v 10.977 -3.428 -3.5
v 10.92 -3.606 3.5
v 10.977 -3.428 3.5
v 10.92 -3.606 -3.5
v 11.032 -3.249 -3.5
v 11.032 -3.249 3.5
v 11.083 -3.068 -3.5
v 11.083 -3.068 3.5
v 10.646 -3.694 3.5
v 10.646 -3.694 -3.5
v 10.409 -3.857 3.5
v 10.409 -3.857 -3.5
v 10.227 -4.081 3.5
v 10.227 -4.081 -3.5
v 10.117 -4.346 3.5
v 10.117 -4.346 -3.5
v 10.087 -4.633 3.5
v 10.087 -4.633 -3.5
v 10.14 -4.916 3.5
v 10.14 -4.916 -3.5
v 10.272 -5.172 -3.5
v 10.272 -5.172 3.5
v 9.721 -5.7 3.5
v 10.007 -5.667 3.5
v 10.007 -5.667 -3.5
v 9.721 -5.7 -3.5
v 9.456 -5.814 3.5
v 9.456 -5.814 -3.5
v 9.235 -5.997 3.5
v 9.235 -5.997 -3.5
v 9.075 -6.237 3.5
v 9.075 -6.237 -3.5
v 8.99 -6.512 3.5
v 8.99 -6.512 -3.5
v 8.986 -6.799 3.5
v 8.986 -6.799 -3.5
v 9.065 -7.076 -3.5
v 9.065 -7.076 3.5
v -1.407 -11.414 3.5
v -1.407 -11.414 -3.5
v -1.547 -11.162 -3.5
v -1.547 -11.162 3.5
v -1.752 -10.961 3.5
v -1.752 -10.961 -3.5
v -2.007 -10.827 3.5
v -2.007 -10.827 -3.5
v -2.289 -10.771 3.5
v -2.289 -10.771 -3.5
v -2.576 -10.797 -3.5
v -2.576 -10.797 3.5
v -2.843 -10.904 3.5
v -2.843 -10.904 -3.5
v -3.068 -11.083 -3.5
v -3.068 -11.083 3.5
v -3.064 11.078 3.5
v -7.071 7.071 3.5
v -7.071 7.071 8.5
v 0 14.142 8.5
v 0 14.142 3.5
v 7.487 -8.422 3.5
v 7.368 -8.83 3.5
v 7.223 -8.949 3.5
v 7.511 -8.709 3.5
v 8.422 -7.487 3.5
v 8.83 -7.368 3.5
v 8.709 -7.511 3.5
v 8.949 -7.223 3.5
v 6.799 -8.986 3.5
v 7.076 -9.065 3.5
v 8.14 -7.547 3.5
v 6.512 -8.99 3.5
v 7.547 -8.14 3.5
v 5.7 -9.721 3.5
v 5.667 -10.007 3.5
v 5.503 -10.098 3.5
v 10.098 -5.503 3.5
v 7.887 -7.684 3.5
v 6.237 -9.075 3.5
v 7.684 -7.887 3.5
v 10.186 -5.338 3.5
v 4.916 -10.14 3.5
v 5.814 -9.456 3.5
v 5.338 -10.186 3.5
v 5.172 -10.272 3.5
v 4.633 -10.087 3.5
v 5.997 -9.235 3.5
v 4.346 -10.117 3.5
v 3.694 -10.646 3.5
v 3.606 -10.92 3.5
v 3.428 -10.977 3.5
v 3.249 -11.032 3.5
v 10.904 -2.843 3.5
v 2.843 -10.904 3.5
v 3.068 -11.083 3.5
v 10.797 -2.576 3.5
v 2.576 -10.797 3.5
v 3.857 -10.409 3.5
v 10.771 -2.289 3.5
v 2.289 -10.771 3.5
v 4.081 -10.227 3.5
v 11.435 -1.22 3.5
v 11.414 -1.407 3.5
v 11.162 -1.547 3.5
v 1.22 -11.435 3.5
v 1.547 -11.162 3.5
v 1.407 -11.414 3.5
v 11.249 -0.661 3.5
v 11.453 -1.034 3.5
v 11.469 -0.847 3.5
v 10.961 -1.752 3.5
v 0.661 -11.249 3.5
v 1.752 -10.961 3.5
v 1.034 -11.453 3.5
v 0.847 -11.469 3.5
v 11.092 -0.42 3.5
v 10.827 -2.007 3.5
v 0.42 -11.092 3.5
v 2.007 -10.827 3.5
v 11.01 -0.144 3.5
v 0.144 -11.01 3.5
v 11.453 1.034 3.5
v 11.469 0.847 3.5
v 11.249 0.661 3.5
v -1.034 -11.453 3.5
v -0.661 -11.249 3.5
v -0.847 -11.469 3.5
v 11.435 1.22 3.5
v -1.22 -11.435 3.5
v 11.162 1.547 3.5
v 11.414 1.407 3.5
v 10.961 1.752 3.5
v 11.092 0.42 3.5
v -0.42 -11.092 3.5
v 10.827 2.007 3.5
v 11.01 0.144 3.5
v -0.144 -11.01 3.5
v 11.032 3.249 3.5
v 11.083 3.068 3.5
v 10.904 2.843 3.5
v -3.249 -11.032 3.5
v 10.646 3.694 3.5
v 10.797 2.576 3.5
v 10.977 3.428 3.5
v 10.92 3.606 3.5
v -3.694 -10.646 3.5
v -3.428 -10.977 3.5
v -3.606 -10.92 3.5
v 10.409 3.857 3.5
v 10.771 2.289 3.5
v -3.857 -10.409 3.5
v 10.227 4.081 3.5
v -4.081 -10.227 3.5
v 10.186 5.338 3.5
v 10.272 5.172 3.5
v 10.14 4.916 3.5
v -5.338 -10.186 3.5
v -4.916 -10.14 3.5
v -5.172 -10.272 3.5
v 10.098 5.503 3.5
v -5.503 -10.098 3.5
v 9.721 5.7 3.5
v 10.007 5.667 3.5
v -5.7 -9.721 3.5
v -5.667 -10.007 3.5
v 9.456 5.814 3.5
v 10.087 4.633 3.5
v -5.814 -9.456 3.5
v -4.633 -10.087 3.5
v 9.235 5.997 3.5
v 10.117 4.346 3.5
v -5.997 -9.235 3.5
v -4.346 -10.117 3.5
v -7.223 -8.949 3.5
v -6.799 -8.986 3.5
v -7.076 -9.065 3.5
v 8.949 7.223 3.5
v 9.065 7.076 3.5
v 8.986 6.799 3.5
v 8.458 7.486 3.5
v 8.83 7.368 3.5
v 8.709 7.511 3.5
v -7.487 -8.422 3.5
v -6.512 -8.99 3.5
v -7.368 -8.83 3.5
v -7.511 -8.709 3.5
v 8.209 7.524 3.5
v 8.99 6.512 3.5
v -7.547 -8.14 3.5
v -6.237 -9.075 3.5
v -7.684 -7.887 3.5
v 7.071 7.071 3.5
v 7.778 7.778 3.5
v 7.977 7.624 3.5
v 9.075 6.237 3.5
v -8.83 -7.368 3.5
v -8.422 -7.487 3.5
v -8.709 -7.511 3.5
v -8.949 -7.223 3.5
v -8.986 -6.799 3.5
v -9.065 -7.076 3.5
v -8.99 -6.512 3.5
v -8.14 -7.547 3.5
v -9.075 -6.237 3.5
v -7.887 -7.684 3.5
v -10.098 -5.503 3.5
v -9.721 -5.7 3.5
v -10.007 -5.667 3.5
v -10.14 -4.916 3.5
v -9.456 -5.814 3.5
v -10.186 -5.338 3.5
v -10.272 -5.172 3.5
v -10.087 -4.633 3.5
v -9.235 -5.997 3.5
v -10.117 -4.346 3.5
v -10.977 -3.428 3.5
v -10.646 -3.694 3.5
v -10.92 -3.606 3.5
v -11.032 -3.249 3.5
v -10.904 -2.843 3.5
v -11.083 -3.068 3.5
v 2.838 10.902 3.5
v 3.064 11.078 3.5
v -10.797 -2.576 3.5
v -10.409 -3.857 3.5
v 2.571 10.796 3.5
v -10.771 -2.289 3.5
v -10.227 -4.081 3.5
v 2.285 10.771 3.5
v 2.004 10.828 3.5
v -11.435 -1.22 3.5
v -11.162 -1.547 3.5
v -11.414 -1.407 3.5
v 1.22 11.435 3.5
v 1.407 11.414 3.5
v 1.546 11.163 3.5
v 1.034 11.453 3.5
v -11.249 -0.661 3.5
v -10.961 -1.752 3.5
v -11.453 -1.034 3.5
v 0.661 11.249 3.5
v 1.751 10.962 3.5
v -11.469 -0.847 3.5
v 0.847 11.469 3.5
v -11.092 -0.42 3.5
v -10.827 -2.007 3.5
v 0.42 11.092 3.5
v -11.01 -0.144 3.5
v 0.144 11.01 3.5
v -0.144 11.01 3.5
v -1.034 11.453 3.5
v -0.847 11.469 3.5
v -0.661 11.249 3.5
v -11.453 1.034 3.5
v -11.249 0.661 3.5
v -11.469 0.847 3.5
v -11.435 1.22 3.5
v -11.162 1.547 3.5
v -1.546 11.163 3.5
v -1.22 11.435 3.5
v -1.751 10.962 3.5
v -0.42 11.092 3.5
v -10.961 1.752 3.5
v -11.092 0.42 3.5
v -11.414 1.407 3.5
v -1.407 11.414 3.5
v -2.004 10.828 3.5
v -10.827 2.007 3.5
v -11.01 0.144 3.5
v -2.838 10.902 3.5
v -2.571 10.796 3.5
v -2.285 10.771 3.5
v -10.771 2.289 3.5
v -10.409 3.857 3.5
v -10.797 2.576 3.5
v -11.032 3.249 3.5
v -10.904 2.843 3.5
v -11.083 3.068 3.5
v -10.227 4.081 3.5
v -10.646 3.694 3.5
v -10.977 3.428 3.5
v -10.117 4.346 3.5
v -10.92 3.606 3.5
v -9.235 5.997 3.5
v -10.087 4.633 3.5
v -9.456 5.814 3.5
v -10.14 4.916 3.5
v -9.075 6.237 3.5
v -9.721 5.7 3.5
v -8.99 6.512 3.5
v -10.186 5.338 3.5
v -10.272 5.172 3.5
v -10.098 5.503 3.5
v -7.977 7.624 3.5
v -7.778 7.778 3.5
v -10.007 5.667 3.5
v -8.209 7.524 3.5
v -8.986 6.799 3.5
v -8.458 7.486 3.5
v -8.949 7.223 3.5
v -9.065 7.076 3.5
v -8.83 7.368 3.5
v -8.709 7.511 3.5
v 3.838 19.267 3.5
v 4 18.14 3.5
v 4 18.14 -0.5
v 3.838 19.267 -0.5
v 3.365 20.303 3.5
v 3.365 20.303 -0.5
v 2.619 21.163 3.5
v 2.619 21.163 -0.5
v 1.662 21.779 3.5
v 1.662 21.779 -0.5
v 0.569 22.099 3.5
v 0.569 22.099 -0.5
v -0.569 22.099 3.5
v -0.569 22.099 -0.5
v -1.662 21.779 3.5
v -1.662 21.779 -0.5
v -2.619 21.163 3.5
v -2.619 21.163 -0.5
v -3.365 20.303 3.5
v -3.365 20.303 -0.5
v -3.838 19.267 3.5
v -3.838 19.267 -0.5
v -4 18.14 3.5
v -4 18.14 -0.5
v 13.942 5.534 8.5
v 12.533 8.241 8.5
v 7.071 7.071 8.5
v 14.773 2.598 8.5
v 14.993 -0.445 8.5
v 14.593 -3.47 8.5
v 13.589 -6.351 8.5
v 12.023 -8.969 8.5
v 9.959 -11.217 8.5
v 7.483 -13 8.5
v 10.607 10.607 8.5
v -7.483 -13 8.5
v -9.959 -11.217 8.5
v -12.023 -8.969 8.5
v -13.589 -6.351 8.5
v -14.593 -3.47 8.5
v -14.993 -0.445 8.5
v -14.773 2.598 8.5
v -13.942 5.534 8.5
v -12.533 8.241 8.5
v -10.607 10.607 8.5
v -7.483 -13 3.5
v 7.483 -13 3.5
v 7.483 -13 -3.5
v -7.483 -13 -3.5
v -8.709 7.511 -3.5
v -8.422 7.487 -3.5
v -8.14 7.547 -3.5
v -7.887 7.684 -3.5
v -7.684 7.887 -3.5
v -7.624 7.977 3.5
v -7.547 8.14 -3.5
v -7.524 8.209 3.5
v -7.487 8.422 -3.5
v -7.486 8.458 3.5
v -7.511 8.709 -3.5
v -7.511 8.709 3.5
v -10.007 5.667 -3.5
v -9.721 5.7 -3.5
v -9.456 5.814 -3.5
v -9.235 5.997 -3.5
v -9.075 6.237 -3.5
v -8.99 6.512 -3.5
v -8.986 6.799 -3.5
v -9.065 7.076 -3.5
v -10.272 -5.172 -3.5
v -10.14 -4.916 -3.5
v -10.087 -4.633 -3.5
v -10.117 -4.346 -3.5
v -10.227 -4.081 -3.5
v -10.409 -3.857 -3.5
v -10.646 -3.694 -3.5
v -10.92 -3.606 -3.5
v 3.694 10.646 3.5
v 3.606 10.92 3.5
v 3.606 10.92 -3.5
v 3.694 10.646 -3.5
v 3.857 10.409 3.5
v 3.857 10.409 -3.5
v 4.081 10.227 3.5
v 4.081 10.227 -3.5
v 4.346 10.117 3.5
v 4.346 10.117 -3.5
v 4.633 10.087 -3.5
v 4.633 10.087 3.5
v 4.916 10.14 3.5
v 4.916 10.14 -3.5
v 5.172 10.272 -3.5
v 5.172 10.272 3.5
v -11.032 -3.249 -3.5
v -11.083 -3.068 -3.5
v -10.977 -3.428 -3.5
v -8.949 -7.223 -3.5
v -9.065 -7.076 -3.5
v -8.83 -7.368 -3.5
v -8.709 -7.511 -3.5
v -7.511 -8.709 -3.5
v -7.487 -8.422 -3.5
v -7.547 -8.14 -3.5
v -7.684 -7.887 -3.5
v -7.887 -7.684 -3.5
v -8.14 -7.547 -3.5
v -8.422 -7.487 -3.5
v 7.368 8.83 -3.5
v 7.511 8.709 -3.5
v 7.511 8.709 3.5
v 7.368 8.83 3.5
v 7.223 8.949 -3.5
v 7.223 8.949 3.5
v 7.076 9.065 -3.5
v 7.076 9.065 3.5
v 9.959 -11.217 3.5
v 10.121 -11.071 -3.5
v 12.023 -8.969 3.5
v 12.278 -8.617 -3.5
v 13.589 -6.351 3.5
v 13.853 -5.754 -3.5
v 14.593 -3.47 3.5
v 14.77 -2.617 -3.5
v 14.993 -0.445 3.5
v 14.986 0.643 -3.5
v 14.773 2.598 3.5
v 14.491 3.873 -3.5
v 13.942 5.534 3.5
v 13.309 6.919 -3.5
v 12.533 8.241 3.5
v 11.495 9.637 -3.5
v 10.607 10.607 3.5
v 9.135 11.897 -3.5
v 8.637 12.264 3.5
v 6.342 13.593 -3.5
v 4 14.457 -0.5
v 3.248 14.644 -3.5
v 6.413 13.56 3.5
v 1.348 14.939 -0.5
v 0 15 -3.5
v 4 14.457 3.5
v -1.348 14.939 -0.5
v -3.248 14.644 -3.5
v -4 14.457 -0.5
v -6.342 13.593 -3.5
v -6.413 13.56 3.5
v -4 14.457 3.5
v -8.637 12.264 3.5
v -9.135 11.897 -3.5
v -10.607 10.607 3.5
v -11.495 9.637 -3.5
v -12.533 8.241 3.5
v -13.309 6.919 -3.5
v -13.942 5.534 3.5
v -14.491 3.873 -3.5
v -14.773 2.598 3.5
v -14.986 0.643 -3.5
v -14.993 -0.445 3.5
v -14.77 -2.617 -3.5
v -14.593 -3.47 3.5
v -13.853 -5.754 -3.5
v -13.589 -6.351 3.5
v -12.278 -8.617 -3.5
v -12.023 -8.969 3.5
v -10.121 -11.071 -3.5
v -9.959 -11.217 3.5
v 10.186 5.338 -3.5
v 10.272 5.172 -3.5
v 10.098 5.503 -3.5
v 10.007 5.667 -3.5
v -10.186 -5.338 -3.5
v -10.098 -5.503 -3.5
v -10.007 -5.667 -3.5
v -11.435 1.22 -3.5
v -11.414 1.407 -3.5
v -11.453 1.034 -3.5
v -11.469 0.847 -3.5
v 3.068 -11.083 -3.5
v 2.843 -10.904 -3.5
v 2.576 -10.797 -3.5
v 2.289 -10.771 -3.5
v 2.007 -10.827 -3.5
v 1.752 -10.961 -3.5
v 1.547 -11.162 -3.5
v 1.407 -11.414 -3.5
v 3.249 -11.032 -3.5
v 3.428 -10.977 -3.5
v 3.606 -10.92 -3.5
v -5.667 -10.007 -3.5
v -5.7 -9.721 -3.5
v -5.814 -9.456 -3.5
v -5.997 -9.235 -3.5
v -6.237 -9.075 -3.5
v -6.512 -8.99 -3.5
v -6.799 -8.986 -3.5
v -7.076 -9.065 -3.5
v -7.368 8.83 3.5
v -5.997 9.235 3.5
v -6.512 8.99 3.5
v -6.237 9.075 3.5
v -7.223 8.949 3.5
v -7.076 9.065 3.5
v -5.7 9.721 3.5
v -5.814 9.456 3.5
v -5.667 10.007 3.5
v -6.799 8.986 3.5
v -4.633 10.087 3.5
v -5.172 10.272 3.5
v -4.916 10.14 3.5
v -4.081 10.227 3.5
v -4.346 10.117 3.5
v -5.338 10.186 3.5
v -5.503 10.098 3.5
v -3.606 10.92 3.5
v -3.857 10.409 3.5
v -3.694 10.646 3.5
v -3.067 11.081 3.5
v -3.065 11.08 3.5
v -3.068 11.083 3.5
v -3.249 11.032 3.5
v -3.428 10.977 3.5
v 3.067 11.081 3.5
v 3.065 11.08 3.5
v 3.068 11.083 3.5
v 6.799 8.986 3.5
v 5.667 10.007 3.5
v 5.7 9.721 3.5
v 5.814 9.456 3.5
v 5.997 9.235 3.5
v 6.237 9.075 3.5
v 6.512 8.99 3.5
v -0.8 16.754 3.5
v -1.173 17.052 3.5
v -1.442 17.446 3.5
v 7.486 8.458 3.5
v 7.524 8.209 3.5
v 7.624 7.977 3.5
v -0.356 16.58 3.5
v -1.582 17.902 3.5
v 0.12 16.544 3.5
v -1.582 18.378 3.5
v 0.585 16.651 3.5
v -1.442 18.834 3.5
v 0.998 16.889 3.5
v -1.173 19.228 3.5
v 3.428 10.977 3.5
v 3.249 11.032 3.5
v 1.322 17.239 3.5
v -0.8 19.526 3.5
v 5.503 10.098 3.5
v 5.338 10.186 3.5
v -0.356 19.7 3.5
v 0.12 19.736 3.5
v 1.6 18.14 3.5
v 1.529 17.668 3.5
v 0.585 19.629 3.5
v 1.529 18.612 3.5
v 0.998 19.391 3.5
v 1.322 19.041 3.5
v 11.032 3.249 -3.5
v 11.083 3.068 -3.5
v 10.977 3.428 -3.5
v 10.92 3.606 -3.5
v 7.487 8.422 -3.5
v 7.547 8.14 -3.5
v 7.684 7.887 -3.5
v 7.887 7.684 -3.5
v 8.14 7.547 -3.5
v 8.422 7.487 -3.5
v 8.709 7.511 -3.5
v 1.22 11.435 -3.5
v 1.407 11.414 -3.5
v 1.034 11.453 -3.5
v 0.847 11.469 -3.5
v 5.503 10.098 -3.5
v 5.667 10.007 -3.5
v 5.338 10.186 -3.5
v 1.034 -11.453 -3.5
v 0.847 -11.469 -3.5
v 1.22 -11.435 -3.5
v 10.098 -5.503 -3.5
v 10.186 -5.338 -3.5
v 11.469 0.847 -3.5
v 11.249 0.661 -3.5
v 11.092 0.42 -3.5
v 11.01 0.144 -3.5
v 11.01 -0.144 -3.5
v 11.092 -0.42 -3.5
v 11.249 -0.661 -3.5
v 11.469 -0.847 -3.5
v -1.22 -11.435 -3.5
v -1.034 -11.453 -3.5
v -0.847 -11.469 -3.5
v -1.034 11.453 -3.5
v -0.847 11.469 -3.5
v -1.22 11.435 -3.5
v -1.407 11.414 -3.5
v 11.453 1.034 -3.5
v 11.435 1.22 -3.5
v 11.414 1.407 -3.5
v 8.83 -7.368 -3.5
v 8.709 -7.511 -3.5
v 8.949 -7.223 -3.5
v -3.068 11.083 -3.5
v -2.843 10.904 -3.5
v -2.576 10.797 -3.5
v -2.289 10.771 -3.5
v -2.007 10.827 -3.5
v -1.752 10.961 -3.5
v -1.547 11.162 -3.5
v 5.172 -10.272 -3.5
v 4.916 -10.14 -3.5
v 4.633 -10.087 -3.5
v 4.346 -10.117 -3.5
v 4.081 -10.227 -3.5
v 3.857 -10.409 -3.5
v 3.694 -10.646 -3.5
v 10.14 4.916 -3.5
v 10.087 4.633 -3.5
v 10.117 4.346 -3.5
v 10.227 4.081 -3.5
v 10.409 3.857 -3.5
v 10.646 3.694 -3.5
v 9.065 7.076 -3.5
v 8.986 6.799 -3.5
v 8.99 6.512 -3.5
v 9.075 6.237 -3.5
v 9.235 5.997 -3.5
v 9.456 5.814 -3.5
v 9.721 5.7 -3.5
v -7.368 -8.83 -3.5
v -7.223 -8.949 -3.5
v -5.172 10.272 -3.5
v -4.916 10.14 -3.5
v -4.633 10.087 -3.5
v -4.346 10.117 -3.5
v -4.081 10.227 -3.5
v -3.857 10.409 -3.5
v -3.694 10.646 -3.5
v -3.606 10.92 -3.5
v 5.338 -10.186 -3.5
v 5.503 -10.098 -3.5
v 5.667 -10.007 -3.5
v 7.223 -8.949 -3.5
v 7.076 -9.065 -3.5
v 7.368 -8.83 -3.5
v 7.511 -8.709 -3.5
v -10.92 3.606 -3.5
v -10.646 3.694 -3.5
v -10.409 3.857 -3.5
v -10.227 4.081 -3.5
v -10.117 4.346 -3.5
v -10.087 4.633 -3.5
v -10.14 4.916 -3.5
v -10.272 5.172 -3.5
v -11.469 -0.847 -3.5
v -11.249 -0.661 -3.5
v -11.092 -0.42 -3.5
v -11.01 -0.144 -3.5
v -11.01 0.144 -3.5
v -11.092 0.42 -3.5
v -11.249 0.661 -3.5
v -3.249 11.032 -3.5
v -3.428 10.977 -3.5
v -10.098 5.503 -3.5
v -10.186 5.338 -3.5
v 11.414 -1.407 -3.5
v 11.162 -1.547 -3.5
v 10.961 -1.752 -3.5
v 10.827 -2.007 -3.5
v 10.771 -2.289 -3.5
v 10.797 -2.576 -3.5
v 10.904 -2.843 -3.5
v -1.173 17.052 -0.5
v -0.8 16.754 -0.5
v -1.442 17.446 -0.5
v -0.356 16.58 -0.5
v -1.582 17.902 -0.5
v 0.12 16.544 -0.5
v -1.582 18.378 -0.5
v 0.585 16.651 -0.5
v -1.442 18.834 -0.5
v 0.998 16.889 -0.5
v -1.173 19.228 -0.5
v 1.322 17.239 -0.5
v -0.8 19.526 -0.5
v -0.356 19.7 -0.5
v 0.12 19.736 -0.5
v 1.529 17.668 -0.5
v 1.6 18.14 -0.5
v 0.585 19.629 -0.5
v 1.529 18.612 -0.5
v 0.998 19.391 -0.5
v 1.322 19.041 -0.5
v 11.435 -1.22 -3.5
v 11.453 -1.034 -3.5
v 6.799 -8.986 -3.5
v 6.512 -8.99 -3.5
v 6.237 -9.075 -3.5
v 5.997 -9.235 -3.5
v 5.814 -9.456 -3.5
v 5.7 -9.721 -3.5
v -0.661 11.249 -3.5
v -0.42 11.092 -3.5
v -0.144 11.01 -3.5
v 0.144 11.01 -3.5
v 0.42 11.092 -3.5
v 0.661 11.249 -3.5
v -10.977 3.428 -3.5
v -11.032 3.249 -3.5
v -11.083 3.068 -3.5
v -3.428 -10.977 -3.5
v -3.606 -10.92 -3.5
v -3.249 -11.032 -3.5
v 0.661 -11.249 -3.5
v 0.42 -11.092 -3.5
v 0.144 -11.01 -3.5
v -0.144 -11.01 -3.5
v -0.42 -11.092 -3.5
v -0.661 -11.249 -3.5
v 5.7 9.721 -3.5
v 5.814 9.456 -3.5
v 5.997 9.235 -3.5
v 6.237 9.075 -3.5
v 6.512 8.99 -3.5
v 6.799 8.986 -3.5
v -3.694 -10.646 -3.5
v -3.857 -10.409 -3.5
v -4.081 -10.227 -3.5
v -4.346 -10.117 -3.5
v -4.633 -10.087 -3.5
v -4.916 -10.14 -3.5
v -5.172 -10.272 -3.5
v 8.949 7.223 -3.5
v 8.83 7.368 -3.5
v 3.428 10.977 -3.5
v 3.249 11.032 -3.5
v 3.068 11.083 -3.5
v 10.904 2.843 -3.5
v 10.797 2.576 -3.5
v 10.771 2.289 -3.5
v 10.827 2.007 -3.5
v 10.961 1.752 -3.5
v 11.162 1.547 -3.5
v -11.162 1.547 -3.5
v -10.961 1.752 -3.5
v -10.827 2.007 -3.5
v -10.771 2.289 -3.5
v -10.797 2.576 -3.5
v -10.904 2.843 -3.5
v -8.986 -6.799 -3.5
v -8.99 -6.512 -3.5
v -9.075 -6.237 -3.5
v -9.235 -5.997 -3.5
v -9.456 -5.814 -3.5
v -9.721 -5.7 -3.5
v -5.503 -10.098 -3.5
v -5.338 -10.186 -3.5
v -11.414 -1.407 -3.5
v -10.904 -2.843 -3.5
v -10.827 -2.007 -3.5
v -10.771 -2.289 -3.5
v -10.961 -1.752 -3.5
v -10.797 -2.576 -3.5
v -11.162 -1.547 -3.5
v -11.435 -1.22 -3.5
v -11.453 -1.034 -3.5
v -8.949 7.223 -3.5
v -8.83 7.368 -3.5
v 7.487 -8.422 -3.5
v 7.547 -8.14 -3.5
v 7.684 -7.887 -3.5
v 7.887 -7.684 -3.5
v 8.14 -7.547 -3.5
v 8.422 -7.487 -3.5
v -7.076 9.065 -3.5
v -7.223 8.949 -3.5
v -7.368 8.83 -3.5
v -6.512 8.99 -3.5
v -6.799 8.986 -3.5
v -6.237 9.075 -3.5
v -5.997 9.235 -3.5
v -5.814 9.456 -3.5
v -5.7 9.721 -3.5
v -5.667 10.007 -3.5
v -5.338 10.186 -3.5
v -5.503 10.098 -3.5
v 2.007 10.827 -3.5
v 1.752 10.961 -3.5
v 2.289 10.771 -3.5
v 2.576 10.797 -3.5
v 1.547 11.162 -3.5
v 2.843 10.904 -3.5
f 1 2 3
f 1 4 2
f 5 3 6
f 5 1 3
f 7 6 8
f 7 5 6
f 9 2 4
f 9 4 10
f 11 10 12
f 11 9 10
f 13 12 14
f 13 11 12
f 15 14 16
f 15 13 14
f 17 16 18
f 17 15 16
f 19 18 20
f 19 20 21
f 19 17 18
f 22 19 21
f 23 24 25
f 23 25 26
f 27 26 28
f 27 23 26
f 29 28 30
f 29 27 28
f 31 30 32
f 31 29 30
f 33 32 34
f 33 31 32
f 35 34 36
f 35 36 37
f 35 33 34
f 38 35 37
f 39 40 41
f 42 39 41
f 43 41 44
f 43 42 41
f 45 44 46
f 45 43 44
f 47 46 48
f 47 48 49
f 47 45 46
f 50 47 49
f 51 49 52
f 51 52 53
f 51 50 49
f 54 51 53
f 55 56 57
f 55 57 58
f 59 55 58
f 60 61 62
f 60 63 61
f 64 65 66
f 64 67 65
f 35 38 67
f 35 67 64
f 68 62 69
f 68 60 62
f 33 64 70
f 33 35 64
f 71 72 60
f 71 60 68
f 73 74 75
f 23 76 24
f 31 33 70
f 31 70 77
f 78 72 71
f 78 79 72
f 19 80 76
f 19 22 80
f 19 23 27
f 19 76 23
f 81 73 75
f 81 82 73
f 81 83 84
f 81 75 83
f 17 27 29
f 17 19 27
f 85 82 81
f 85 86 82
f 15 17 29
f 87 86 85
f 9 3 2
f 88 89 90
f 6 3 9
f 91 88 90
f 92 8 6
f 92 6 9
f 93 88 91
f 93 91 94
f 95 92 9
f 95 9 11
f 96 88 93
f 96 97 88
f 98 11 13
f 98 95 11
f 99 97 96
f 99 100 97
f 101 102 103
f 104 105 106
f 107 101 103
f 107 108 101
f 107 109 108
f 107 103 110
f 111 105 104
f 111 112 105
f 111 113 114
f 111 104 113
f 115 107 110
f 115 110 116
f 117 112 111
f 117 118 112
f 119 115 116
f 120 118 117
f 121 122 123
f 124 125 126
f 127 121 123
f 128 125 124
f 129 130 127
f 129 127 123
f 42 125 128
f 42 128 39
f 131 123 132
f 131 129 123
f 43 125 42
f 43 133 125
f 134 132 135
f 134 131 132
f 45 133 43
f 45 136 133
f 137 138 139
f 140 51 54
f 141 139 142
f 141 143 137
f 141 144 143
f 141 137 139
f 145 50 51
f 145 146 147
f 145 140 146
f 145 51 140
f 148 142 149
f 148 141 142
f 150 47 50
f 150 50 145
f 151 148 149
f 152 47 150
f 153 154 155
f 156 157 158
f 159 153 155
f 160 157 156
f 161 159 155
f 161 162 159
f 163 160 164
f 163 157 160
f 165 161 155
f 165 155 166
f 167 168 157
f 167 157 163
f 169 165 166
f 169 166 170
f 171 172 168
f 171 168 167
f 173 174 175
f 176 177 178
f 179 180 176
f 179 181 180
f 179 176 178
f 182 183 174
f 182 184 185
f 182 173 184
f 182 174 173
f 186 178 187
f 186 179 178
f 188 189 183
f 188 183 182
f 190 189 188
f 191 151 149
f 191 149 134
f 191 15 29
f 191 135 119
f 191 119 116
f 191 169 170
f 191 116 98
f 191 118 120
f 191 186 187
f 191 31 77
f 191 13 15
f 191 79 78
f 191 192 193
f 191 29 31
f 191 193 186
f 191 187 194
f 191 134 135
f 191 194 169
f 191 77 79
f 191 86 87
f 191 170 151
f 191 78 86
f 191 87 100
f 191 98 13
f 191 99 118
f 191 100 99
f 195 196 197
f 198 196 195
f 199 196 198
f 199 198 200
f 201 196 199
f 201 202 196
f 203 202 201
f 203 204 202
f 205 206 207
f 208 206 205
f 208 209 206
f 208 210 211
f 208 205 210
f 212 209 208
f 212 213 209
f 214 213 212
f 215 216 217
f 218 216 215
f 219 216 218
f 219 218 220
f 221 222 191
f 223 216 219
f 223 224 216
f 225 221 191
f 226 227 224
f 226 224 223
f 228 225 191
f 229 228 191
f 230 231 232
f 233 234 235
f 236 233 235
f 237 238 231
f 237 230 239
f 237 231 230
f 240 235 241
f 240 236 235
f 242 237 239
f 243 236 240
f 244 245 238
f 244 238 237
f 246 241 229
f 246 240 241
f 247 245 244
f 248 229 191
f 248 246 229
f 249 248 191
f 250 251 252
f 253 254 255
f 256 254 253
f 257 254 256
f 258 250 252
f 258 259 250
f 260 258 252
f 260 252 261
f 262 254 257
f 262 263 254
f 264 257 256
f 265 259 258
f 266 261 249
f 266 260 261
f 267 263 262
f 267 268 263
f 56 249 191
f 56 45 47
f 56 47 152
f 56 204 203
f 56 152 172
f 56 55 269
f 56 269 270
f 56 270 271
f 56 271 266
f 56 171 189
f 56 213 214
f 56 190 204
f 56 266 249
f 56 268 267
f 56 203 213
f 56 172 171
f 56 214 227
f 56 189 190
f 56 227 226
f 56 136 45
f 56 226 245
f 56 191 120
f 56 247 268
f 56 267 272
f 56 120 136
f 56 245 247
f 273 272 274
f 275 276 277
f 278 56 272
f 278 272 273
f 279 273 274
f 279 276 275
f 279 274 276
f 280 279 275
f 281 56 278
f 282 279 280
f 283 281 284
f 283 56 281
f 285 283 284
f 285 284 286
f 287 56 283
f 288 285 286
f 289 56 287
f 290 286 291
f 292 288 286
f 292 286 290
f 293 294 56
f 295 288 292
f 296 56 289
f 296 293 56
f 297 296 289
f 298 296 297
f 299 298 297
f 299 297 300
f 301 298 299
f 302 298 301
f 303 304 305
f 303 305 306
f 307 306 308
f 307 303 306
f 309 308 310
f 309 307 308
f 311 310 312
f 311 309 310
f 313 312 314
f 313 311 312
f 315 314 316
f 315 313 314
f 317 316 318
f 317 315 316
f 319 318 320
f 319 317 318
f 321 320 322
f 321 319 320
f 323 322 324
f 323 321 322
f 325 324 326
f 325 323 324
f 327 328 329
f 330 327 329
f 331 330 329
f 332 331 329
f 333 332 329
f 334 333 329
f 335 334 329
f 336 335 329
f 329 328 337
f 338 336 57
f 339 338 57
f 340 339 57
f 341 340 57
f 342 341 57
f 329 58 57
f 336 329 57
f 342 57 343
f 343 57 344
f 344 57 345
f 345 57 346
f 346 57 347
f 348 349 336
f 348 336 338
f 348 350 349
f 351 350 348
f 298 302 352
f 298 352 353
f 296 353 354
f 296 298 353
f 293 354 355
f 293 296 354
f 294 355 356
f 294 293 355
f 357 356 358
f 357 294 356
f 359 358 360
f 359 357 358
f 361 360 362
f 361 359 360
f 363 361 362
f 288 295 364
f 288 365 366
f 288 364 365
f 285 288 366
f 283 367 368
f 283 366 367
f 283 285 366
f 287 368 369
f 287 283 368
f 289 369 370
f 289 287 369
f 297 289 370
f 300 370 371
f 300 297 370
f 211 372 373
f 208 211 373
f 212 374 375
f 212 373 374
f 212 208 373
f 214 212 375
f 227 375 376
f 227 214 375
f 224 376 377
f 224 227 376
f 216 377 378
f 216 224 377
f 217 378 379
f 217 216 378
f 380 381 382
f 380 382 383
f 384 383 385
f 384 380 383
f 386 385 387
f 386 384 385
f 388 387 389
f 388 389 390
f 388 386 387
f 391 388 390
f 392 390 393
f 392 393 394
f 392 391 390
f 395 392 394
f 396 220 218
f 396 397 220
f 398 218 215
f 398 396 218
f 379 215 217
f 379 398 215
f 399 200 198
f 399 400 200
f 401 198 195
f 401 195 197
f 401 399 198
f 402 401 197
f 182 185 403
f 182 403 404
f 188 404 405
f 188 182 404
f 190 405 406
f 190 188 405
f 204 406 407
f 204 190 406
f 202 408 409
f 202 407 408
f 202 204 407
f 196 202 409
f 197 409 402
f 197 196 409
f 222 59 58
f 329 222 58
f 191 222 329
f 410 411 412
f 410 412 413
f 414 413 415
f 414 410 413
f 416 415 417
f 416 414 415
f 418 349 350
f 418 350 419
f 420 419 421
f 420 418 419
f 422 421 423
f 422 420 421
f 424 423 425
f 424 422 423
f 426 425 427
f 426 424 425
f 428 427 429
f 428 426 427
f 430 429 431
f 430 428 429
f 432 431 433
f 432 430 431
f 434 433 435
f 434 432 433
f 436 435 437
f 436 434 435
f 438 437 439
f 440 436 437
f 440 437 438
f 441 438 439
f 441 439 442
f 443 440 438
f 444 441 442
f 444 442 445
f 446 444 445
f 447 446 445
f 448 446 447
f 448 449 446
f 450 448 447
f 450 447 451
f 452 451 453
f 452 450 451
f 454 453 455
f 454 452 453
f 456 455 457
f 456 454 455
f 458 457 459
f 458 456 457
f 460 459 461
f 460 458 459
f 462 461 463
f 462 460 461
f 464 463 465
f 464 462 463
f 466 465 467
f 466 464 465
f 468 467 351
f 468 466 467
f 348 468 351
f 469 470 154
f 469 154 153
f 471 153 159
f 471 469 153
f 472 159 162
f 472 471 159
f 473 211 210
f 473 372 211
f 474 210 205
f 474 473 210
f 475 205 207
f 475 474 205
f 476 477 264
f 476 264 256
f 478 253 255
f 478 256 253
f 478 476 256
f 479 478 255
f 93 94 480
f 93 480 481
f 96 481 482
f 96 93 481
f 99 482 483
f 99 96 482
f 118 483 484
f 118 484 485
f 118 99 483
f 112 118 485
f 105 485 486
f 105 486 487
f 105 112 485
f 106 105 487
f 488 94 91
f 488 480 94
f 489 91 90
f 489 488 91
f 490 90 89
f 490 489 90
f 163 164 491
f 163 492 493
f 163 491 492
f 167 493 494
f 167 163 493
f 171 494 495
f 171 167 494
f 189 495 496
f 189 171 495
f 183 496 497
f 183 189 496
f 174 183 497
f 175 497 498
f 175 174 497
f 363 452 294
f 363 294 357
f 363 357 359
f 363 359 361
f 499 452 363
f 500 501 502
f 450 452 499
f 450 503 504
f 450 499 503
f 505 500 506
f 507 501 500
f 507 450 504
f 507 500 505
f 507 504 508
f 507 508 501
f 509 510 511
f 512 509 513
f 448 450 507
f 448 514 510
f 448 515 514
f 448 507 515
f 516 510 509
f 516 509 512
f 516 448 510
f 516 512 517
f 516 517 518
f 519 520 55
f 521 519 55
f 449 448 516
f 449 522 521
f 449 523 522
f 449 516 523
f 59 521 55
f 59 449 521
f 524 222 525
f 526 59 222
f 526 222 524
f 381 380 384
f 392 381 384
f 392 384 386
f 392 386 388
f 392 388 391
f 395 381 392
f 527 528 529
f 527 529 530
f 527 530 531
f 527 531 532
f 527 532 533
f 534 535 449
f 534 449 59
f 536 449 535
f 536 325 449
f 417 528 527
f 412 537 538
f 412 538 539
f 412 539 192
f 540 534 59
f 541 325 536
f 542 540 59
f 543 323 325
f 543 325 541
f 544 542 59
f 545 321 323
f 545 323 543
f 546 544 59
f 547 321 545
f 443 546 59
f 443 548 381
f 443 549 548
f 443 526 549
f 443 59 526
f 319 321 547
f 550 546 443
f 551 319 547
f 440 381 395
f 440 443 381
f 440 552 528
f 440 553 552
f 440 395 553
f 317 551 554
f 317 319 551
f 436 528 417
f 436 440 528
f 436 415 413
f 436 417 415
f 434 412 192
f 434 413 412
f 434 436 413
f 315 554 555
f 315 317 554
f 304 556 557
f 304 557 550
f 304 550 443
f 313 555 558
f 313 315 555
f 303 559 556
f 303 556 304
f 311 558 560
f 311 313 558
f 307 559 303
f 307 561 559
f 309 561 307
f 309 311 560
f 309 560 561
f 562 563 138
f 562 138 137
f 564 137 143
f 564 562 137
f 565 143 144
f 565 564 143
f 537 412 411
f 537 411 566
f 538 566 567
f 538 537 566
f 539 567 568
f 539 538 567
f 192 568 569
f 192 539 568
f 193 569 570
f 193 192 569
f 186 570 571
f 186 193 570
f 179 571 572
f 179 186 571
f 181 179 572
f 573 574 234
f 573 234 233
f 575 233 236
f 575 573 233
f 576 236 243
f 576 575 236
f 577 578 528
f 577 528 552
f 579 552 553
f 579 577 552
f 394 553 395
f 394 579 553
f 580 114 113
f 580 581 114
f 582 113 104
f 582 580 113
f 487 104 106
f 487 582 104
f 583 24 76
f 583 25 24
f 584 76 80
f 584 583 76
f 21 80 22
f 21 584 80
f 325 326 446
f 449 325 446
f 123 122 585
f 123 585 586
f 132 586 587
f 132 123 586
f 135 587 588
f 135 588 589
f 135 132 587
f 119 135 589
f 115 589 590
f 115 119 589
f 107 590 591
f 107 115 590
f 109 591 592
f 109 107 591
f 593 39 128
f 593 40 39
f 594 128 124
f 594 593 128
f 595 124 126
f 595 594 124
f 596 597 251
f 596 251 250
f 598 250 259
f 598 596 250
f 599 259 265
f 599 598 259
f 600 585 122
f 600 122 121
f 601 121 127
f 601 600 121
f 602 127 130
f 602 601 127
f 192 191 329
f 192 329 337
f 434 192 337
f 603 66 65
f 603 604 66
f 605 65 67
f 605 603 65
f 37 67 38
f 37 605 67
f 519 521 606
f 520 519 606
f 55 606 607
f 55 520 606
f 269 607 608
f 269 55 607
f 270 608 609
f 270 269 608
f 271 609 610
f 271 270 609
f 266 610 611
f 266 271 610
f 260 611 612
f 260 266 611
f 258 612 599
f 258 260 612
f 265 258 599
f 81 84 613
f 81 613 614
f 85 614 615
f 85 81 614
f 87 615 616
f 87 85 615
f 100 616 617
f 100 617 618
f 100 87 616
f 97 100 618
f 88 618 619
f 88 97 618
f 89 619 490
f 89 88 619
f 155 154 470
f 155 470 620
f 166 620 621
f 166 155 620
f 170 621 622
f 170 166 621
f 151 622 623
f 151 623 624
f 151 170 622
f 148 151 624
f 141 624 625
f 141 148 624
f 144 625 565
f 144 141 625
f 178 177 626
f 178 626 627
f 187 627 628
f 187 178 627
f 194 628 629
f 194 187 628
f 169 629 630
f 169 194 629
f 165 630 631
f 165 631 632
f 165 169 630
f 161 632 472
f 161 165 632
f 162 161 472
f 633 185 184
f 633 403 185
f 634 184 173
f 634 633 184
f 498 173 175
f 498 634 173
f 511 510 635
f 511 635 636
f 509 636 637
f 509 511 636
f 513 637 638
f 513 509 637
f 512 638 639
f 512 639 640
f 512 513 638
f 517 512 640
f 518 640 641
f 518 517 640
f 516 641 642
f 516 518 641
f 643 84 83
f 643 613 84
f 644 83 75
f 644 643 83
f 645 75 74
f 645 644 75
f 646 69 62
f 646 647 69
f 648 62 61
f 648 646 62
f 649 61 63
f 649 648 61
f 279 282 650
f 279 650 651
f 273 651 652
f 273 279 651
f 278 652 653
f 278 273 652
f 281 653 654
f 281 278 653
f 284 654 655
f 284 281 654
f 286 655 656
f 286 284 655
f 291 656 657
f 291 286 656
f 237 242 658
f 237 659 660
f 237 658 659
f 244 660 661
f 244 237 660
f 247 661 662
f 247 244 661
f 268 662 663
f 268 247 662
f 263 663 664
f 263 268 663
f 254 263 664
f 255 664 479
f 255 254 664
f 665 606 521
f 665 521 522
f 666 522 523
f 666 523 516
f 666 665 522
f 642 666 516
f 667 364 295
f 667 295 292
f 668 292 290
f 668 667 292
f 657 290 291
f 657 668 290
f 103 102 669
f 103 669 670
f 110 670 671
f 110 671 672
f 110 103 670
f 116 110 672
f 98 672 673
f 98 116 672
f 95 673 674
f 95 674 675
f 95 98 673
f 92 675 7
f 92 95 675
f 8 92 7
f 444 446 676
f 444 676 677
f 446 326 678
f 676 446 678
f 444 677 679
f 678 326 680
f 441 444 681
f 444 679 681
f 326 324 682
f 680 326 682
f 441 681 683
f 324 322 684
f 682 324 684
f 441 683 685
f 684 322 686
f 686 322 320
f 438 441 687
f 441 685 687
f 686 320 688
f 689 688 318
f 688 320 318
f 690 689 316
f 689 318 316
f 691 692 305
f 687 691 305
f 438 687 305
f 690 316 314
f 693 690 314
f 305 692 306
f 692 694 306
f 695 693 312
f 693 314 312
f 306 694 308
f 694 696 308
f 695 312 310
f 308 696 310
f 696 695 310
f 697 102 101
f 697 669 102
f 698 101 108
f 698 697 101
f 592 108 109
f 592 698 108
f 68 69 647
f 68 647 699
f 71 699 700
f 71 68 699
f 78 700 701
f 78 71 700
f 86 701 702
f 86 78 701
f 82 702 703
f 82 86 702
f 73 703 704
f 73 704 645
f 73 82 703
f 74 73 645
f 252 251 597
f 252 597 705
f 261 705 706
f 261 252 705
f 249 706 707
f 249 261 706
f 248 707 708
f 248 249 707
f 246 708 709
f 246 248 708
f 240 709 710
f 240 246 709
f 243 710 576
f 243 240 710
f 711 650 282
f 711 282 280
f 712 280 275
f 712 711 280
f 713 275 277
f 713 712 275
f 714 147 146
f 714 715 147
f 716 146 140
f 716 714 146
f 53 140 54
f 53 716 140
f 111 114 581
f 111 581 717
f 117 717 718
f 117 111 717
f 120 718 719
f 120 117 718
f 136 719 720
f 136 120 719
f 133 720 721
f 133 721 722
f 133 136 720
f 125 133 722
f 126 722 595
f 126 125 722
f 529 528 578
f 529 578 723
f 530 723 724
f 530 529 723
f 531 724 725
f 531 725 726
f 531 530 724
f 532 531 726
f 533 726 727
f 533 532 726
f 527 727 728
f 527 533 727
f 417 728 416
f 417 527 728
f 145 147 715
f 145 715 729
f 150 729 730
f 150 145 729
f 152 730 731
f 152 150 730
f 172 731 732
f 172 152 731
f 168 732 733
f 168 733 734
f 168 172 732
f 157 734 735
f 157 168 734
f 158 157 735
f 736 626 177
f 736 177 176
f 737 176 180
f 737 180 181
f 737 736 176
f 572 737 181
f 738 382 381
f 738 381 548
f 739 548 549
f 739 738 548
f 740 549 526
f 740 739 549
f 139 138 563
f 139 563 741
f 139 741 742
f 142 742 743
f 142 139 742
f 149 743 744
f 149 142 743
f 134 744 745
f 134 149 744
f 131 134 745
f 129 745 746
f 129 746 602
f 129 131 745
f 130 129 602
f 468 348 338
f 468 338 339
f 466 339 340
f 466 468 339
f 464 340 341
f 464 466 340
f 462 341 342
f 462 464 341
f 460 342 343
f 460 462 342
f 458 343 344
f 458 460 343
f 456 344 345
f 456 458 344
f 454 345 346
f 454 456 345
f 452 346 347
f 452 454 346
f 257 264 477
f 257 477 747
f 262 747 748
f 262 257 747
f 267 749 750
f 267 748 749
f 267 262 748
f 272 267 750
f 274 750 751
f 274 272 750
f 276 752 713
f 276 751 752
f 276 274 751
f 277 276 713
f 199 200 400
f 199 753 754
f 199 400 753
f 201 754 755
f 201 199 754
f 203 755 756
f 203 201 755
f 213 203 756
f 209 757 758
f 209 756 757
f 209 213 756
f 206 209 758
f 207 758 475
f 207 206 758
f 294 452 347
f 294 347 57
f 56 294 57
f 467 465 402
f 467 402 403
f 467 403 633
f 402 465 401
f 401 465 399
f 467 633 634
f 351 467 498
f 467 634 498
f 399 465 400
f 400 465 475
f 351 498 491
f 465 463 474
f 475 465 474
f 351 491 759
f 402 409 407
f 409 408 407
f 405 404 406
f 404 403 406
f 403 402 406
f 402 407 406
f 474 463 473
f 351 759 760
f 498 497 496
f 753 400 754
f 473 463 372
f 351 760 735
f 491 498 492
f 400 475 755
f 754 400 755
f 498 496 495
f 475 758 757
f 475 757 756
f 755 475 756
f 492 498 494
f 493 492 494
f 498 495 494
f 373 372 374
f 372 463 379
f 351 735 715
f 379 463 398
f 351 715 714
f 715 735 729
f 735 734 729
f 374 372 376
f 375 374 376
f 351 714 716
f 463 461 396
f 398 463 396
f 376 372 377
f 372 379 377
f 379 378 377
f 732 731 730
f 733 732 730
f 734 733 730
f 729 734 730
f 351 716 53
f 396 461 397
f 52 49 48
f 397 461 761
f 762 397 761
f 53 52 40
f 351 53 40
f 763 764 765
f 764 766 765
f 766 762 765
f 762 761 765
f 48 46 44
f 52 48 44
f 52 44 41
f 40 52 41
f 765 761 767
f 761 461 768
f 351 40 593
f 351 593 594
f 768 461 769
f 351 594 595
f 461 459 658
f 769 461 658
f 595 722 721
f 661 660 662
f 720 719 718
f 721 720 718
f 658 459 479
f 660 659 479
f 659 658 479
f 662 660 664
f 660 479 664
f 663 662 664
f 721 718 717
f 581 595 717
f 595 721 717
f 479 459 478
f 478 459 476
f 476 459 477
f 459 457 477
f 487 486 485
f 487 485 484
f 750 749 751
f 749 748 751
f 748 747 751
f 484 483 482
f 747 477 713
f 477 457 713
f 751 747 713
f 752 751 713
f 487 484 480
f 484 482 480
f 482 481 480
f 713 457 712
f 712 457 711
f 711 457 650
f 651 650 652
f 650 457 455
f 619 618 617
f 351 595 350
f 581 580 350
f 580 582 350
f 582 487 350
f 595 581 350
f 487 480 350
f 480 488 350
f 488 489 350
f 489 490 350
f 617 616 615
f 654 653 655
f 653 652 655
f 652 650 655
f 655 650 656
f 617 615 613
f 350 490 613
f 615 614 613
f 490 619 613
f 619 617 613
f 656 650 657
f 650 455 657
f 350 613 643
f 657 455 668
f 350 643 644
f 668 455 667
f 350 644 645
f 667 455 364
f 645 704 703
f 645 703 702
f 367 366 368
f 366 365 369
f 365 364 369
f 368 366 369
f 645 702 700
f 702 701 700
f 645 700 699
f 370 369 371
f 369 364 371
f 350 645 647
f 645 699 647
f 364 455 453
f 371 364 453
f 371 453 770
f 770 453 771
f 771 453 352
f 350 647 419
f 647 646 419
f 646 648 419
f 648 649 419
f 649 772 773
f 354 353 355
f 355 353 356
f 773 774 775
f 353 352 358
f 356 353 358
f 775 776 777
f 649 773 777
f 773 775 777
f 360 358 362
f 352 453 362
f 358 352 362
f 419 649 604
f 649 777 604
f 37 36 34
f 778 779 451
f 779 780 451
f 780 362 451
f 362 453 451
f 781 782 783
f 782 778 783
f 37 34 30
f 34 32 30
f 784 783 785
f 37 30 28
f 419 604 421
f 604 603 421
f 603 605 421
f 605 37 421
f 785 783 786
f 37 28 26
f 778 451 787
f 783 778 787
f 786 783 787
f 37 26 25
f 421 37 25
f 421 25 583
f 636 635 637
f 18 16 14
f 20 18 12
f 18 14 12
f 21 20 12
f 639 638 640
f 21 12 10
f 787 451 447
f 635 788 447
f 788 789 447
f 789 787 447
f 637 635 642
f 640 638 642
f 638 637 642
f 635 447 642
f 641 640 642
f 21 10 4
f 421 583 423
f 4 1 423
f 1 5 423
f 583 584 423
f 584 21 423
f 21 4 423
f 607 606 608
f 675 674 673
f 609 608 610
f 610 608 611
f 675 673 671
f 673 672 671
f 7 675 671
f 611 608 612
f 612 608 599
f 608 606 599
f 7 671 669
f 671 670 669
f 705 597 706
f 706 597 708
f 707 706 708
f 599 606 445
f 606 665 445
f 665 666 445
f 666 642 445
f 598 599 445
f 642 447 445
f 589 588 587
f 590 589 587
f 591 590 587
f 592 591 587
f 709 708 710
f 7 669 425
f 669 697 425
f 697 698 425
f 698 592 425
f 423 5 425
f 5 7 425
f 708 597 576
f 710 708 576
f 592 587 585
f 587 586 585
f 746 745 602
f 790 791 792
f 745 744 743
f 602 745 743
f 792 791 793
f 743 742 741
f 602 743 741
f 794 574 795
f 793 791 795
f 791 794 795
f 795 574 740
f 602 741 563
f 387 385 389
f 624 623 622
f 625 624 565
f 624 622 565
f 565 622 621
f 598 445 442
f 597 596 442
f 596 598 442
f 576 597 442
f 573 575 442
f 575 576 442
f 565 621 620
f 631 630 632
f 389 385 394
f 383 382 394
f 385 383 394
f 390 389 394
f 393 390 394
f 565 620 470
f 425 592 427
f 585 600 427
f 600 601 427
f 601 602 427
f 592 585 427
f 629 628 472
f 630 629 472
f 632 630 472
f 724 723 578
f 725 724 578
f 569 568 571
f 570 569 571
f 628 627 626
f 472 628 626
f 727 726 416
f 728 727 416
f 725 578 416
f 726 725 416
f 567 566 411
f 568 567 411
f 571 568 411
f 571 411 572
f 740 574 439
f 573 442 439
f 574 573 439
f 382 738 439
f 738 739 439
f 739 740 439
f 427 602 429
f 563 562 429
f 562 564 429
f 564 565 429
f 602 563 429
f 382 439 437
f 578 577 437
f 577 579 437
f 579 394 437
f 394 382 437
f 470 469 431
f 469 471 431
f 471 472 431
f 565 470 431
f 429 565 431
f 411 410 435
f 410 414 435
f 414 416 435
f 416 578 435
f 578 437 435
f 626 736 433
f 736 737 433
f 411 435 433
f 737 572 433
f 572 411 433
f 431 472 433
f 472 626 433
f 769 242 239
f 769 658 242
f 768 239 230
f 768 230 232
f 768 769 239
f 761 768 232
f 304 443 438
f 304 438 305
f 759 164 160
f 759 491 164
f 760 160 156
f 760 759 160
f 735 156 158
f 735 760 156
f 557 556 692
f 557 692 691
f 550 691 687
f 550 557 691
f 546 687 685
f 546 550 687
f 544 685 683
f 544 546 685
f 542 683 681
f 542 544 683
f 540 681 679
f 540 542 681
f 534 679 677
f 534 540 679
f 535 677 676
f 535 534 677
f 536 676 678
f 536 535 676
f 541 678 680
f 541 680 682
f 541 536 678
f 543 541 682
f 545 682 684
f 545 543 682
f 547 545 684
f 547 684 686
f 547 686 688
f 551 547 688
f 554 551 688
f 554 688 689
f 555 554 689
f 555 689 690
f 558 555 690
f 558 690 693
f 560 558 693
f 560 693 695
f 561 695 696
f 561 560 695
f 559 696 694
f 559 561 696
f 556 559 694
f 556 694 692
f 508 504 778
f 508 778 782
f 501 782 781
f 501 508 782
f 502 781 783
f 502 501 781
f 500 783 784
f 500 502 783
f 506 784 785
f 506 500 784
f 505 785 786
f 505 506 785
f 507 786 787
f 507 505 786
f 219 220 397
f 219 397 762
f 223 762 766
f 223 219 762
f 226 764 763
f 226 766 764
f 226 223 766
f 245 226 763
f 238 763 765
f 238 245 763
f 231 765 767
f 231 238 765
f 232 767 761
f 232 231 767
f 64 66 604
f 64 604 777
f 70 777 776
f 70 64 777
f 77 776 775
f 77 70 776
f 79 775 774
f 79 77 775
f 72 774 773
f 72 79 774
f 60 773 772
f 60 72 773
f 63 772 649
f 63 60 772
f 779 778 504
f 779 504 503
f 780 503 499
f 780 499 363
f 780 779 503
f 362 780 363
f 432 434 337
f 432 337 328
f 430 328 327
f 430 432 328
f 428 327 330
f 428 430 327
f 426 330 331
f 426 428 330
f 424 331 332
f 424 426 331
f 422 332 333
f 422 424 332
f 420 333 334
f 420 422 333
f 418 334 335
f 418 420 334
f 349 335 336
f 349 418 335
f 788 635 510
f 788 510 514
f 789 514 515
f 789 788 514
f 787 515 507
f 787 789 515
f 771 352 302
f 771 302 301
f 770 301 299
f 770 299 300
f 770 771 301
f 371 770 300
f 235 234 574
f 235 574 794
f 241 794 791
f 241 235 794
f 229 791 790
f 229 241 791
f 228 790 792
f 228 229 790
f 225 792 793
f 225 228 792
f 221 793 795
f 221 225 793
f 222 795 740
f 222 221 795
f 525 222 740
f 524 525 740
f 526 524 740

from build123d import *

# Parameters (mm, degrees)
SKETCH1_R               = 1
BOSS_EXTRUDE1_DEPTH     = 3.5
BOSS_EXTRUDE1_2_DEPTH   = 3.5
BOSS_EXTRUDE1_3_DEPTH   = 3.5
BOSS_EXTRUDE1_4_DEPTH   = 3.5
BOSS_EXTRUDE1_5_DEPTH   = 3.5
BOSS_EXTRUDE1_6_DEPTH   = 3.5
BOSS_EXTRUDE1_7_DEPTH   = 3.5
BOSS_EXTRUDE1_8_DEPTH   = 3.5
BOSS_EXTRUDE1_9_DEPTH   = 3.5
BOSS_EXTRUDE1_10_DEPTH  = 3.5
BOSS_EXTRUDE1_11_DEPTH  = 3.5
BOSS_EXTRUDE1_12_DEPTH  = 3.5
BOSS_EXTRUDE1_13_DEPTH  = 3.5
BOSS_EXTRUDE1_14_DEPTH  = 3.5
BOSS_EXTRUDE1_15_DEPTH  = 3.5
BOSS_EXTRUDE1_16_DEPTH  = 3.5
BOSS_EXTRUDE1_17_DEPTH  = 3.5
BOSS_EXTRUDE1_18_DEPTH  = 3.5
BOSS_EXTRUDE1_19_DEPTH  = 3.5
BOSS_EXTRUDE1_20_DEPTH  = 3.5
BOSS_EXTRUDE1_21_DEPTH  = 3.5
BOSS_EXTRUDE1_22_DEPTH  = 3.5
BOSS_EXTRUDE1_23_DEPTH  = 3.5
BOSS_EXTRUDE1_24_DEPTH  = 3.5
BOSS_EXTRUDE1_25_DEPTH  = 3.5
BOSS_EXTRUDE1_26_DEPTH  = 3.5
BOSS_EXTRUDE1_27_DEPTH  = 3.5
BOSS_EXTRUDE1_28_DEPTH  = 3.5
BOSS_EXTRUDE1_29_DEPTH  = 3.5
BOSS_EXTRUDE1_30_DEPTH  = 3.5
BOSS_EXTRUDE1_31_DEPTH  = 3.5
BOSS_EXTRUDE1_32_DEPTH  = 3.5
SKETCH2_R               = 15
SKETCH2_R_2             = 11.5
BOSS_EXTRUDE2_DEPTH     = 3.5
BOSS_EXTRUDE5_START     = -7
SKETCH3_R               = 1.6
BOSS_EXTRUDE5_DEPTH     = 4
BOSS_EXTRUDE4_DEPTH     = 5
CUT_EXTRUDE1_DEPTH      = 30.311765556
CUT_EXTRUDE1_DEPTH_BACK = 30.311765556
BOSS_EXTRUDE6_DEPTH     = 5


with BuildPart() as part:
    # Sketch1 → Boss-Extrude1 (new, symmetric)
    with BuildSketch(Plane.XY):
        with Locations((12, 0)):
            Circle(SKETCH1_R)
    extrude(amount=BOSS_EXTRUDE1_DEPTH, both=True)



with BuildPart() as body_2:
    # Sketch1 → Boss-Extrude1 2 (new, symmetric)
    with BuildSketch(Plane.XY):
        with Locations((11.769423365, -2.341083864)):
            Circle(SKETCH1_R)
    extrude(amount=BOSS_EXTRUDE1_2_DEPTH, both=True)


with BuildPart() as body_3:
    # Sketch1 → Boss-Extrude1 3 (new, symmetric)
    with BuildSketch(Plane.XY):
        with Locations((11.08655439, -4.592201188)):
            Circle(SKETCH1_R)
    extrude(amount=BOSS_EXTRUDE1_3_DEPTH, both=True)


with BuildPart() as body_4:
    # Sketch1 → Boss-Extrude1 4 (new, symmetric)
    with BuildSketch(Plane.XY):
        with Locations((9.977635348, -6.666842796)):
            Circle(SKETCH1_R)
    extrude(amount=BOSS_EXTRUDE1_4_DEPTH, both=True)


with BuildPart() as body_5:
    # Sketch1 → Boss-Extrude1 5 (new, symmetric)
    with BuildSketch(Plane.XY):
        with Locations((8.485281374, -8.485281374)):
            Circle(SKETCH1_R)
    extrude(amount=BOSS_EXTRUDE1_5_DEPTH, both=True)


with BuildPart() as body_6:
    # Sketch1 → Boss-Extrude1 6 (new, symmetric)
    with BuildSketch(Plane.XY):
        with Locations((6.666842796, -9.977635348)):
            Circle(SKETCH1_R)
    extrude(amount=BOSS_EXTRUDE1_6_DEPTH, both=True)


with BuildPart() as body_7:
    # Sketch1 → Boss-Extrude1 7 (new, symmetric)
    with BuildSketch(Plane.XY):
        with Locations((4.592201188, -11.08655439)):
            Circle(SKETCH1_R)
    extrude(amount=BOSS_EXTRUDE1_7_DEPTH, both=True)


with BuildPart() as body_8:
    # Sketch1 → Boss-Extrude1 8 (new, symmetric)
    with BuildSketch(Plane.XY):
        with Locations((2.341083864, -11.769423365)):
            Circle(SKETCH1_R)
    extrude(amount=BOSS_EXTRUDE1_8_DEPTH, both=True)


with BuildPart() as body_9:
    # Sketch1 → Boss-Extrude1 9 (new, symmetric)
    with BuildSketch(Plane.XY):
        with Locations((0, -12)):
            Circle(SKETCH1_R)
    extrude(amount=BOSS_EXTRUDE1_9_DEPTH, both=True)


with BuildPart() as body_10:
    # Sketch1 → Boss-Extrude1 10 (new, symmetric)
    with BuildSketch(Plane.XY):
        with Locations((-2.341083864, -11.769423365)):
            Circle(SKETCH1_R)
    extrude(amount=BOSS_EXTRUDE1_10_DEPTH, both=True)


with BuildPart() as body_11:
    # Sketch1 → Boss-Extrude1 11 (new, symmetric)
    with BuildSketch(Plane.XY):
        with Locations((-4.592201188, -11.08655439)):
            Circle(SKETCH1_R)
    extrude(amount=BOSS_EXTRUDE1_11_DEPTH, both=True)


with BuildPart() as body_12:
    # Sketch1 → Boss-Extrude1 12 (new, symmetric)
    with BuildSketch(Plane.XY):
        with Locations((-6.666842796, -9.977635348)):
            Circle(SKETCH1_R)
    extrude(amount=BOSS_EXTRUDE1_12_DEPTH, both=True)


with BuildPart() as body_13:
    # Sketch1 → Boss-Extrude1 13 (new, symmetric)
    with BuildSketch(Plane.XY):
        with Locations((-8.485281374, -8.485281374)):
            Circle(SKETCH1_R)
    extrude(amount=BOSS_EXTRUDE1_13_DEPTH, both=True)


with BuildPart() as body_14:
    # Sketch1 → Boss-Extrude1 14 (new, symmetric)
    with BuildSketch(Plane.XY):
        with Locations((-9.977635348, -6.666842796)):
            Circle(SKETCH1_R)
    extrude(amount=BOSS_EXTRUDE1_14_DEPTH, both=True)


with BuildPart() as body_15:
    # Sketch1 → Boss-Extrude1 15 (new, symmetric)
    with BuildSketch(Plane.XY):
        with Locations((-11.08655439, -4.592201188)):
            Circle(SKETCH1_R)
    extrude(amount=BOSS_EXTRUDE1_15_DEPTH, both=True)


with BuildPart() as body_16:
    # Sketch1 → Boss-Extrude1 16 (new, symmetric)
    with BuildSketch(Plane.XY):
        with Locations((-11.769423365, -2.341083864)):
            Circle(SKETCH1_R)
    extrude(amount=BOSS_EXTRUDE1_16_DEPTH, both=True)


with BuildPart() as body_17:
    # Sketch1 → Boss-Extrude1 17 (new, symmetric)
    with BuildSketch(Plane.XY):
        with Locations((-12, 0)):
            Circle(SKETCH1_R)
    extrude(amount=BOSS_EXTRUDE1_17_DEPTH, both=True)


with BuildPart() as body_18:
    # Sketch1 → Boss-Extrude1 18 (new, symmetric)
    with BuildSketch(Plane.XY):
        with Locations((-11.769423365, 2.341083864)):
            Circle(SKETCH1_R)
    extrude(amount=BOSS_EXTRUDE1_18_DEPTH, both=True)


with BuildPart() as body_19:
    # Sketch1 → Boss-Extrude1 19 (new, symmetric)
    with BuildSketch(Plane.XY):
        with Locations((-11.08655439, 4.592201188)):
            Circle(SKETCH1_R)
    extrude(amount=BOSS_EXTRUDE1_19_DEPTH, both=True)


with BuildPart() as body_20:
    # Sketch1 → Boss-Extrude1 20 (new, symmetric)
    with BuildSketch(Plane.XY):
        with Locations((-9.977635348, 6.666842796)):
            Circle(SKETCH1_R)
    extrude(amount=BOSS_EXTRUDE1_20_DEPTH, both=True)


with BuildPart() as body_21:
    # Sketch1 → Boss-Extrude1 21 (new, symmetric)
    with BuildSketch(Plane.XY):
        with Locations((-8.485281374, 8.485281374)):
            Circle(SKETCH1_R)
    extrude(amount=BOSS_EXTRUDE1_21_DEPTH, both=True)


with BuildPart() as body_22:
    # Sketch1 → Boss-Extrude1 22 (new, symmetric)
    with BuildSketch(Plane.XY):
        with Locations((-6.666842796, 9.977635348)):
            Circle(SKETCH1_R)
    extrude(amount=BOSS_EXTRUDE1_22_DEPTH, both=True)


with BuildPart() as body_23:
    # Sketch1 → Boss-Extrude1 23 (new, symmetric)
    with BuildSketch(Plane.XY):
        with Locations((-4.592201188, 11.08655439)):
            Circle(SKETCH1_R)
    extrude(amount=BOSS_EXTRUDE1_23_DEPTH, both=True)


with BuildPart() as body_24:
    # Sketch1 → Boss-Extrude1 24 (new, symmetric)
    with BuildSketch(Plane.XY):
        with Locations((-2.341083864, 11.769423365)):
            Circle(SKETCH1_R)
    extrude(amount=BOSS_EXTRUDE1_24_DEPTH, both=True)


with BuildPart() as body_25:
    # Sketch1 → Boss-Extrude1 25 (new, symmetric)
    with BuildSketch(Plane.XY):
        with Locations((0, 12)):
            Circle(SKETCH1_R)
    extrude(amount=BOSS_EXTRUDE1_25_DEPTH, both=True)


with BuildPart() as body_26:
    # Sketch1 → Boss-Extrude1 26 (new, symmetric)
    with BuildSketch(Plane.XY):
        with Locations((2.341083864, 11.769423365)):
            Circle(SKETCH1_R)
    extrude(amount=BOSS_EXTRUDE1_26_DEPTH, both=True)


with BuildPart() as body_27:
    # Sketch1 → Boss-Extrude1 27 (new, symmetric)
    with BuildSketch(Plane.XY):
        with Locations((4.592201188, 11.08655439)):
            Circle(SKETCH1_R)
    extrude(amount=BOSS_EXTRUDE1_27_DEPTH, both=True)


with BuildPart() as body_28:
    # Sketch1 → Boss-Extrude1 28 (new, symmetric)
    with BuildSketch(Plane.XY):
        with Locations((6.666842796, 9.977635348)):
            Circle(SKETCH1_R)
    extrude(amount=BOSS_EXTRUDE1_28_DEPTH, both=True)


with BuildPart() as body_29:
    # Sketch1 → Boss-Extrude1 29 (new, symmetric)
    with BuildSketch(Plane.XY):
        with Locations((8.485281374, 8.485281374)):
            Circle(SKETCH1_R)
    extrude(amount=BOSS_EXTRUDE1_29_DEPTH, both=True)


with BuildPart() as body_30:
    # Sketch1 → Boss-Extrude1 30 (new, symmetric)
    with BuildSketch(Plane.XY):
        with Locations((9.977635348, 6.666842796)):
            Circle(SKETCH1_R)
    extrude(amount=BOSS_EXTRUDE1_30_DEPTH, both=True)


with BuildPart() as body_31:
    # Sketch1 → Boss-Extrude1 31 (new, symmetric)
    with BuildSketch(Plane.XY):
        with Locations((11.08655439, 4.592201188)):
            Circle(SKETCH1_R)
    extrude(amount=BOSS_EXTRUDE1_31_DEPTH, both=True)


with BuildPart() as body_32:
    # Sketch1 → Boss-Extrude1 32 (new, symmetric)
    with BuildSketch(Plane.XY):
        with Locations((11.769423365, 2.341083864)):
            Circle(SKETCH1_R)
    extrude(amount=BOSS_EXTRUDE1_32_DEPTH, both=True)


with BuildPart() as part_1:
    add(part.part)

    add(body_2.part)  # Boss-Extrude2 merges body 2

    add(body_3.part)  # Boss-Extrude2 merges body 3

    add(body_4.part)  # Boss-Extrude2 merges body 4

    add(body_5.part)  # Boss-Extrude2 merges body 5

    add(body_6.part)  # Boss-Extrude2 merges body 6

    add(body_7.part)  # Boss-Extrude2 merges body 7

    add(body_8.part)  # Boss-Extrude2 merges body 8

    add(body_9.part)  # Boss-Extrude2 merges body 9

    add(body_10.part)  # Boss-Extrude2 merges body 10

    add(body_11.part)  # Boss-Extrude2 merges body 11

    add(body_12.part)  # Boss-Extrude2 merges body 12

    add(body_13.part)  # Boss-Extrude2 merges body 13

    add(body_14.part)  # Boss-Extrude2 merges body 14

    add(body_15.part)  # Boss-Extrude2 merges body 15

    add(body_16.part)  # Boss-Extrude2 merges body 16

    add(body_17.part)  # Boss-Extrude2 merges body 17

    add(body_18.part)  # Boss-Extrude2 merges body 18

    add(body_19.part)  # Boss-Extrude2 merges body 19

    add(body_20.part)  # Boss-Extrude2 merges body 20

    add(body_21.part)  # Boss-Extrude2 merges body 21

    add(body_22.part)  # Boss-Extrude2 merges body 22

    add(body_23.part)  # Boss-Extrude2 merges body 23

    add(body_24.part)  # Boss-Extrude2 merges body 24

    add(body_25.part)  # Boss-Extrude2 merges body 25

    add(body_26.part)  # Boss-Extrude2 merges body 26

    add(body_27.part)  # Boss-Extrude2 merges body 27

    add(body_28.part)  # Boss-Extrude2 merges body 28

    add(body_29.part)  # Boss-Extrude2 merges body 29

    add(body_30.part)  # Boss-Extrude2 merges body 30

    add(body_31.part)  # Boss-Extrude2 merges body 31

    add(body_32.part)  # Boss-Extrude2 merges body 32
    # Sketch2 → Boss-Extrude2 (add, symmetric)
    with BuildSketch(Plane.XY):
        Circle(SKETCH2_R)
        Circle(SKETCH2_R_2, mode=Mode.SUBTRACT)
    extrude(amount=BOSS_EXTRUDE2_DEPTH, both=True)

    # Sketch3 → Boss-Extrude5 (add)
    with BuildSketch(Plane(origin=(0, 0, -3.5), x_dir=(-1, 0, 0), z_dir=(0, 0, -1)).offset(BOSS_EXTRUDE5_START)):
        with BuildLine():
            Line((-4, 14.456832295), (-4, 18.14))
            ThreePointArc((-4, 18.14), (0, 22.14), (4, 18.14))
            Line((4, 18.14), (4, 14.456832295))
            ThreePointArc((4, 14.456832295), (0, 15), (-4, 14.456832295))
        make_face()
        with Locations(Location((0, 18.14, 0), (0, 0, 180))):
            Circle(SKETCH3_R, mode=Mode.SUBTRACT)
    extrude(amount=BOSS_EXTRUDE5_DEPTH)

    # Sketch4 → Boss-Extrude4 (add)
    with BuildSketch(Plane.XY.offset(3.5)):
        with BuildLine():
            Line((-7.778174593, 6.363961031), (0, 14.142135624))
            Line((0, 14.142135624), (7.778174593, 6.363961031))
            ThreePointArc((7.778174593, 6.363961031), (0, -15), (-7.778174593, 6.363961031))
        make_face()
    extrude(amount=BOSS_EXTRUDE4_DEPTH)

    # Sketch5 → Cut-Extrude1 (cut, two sides: drawn at the far end of the back side and taken through both)
    with BuildSketch(Plane.XY.offset(8.5).offset(-CUT_EXTRUDE1_DEPTH_BACK)):
        with BuildLine():
            Line((-7.483314774, -13), (7.483314774, -13))
            ThreePointArc((7.483314774, -13), (3.872983346, -14.491376746), (0, -15))
            ThreePointArc((0, -15), (-3.872983346, -14.491376746), (-7.483314774, -13))
        make_face()
    extrude(amount=CUT_EXTRUDE1_DEPTH + CUT_EXTRUDE1_DEPTH_BACK, mode=Mode.SUBTRACT)

    # Sketch6 → Boss-Extrude6 (add)
    with BuildSketch(Plane.XY.offset(3.5)):
        with BuildLine():
            Line((7.071067812, 7.071067812), (10.606601718, 10.606601718))
            ThreePointArc((10.606601718, 10.606601718), (14.870412934, -1.96743975), (7.483314774, -13))
            Line((7.483314774, -13), (6.662707091, -13))
            ThreePointArc((6.662707091, -13), (12.077893552, -3.597834685), (7.778174593, 6.363961031))
            Line((7.778174593, 6.363961031), (7.071067812, 7.071067812))
        make_face()
        with BuildLine():
            Line((-10.606601718, 10.606601718), (-7.071067812, 7.071067812))
            Line((-7.071067812, 7.071067812), (-7.778174593, 6.363961031))
            ThreePointArc((-7.778174593, 6.363961031), (-12.077893552, -3.597834685), (-6.662707091, -13))
            Line((-6.662707091, -13), (-7.483314774, -13))
            ThreePointArc((-7.483314774, -13), (-14.870412934, -1.96743975), (-10.606601718, 10.606601718))
        make_face()
    extrude(amount=BOSS_EXTRUDE6_DEPTH)


solid = part_1.part
